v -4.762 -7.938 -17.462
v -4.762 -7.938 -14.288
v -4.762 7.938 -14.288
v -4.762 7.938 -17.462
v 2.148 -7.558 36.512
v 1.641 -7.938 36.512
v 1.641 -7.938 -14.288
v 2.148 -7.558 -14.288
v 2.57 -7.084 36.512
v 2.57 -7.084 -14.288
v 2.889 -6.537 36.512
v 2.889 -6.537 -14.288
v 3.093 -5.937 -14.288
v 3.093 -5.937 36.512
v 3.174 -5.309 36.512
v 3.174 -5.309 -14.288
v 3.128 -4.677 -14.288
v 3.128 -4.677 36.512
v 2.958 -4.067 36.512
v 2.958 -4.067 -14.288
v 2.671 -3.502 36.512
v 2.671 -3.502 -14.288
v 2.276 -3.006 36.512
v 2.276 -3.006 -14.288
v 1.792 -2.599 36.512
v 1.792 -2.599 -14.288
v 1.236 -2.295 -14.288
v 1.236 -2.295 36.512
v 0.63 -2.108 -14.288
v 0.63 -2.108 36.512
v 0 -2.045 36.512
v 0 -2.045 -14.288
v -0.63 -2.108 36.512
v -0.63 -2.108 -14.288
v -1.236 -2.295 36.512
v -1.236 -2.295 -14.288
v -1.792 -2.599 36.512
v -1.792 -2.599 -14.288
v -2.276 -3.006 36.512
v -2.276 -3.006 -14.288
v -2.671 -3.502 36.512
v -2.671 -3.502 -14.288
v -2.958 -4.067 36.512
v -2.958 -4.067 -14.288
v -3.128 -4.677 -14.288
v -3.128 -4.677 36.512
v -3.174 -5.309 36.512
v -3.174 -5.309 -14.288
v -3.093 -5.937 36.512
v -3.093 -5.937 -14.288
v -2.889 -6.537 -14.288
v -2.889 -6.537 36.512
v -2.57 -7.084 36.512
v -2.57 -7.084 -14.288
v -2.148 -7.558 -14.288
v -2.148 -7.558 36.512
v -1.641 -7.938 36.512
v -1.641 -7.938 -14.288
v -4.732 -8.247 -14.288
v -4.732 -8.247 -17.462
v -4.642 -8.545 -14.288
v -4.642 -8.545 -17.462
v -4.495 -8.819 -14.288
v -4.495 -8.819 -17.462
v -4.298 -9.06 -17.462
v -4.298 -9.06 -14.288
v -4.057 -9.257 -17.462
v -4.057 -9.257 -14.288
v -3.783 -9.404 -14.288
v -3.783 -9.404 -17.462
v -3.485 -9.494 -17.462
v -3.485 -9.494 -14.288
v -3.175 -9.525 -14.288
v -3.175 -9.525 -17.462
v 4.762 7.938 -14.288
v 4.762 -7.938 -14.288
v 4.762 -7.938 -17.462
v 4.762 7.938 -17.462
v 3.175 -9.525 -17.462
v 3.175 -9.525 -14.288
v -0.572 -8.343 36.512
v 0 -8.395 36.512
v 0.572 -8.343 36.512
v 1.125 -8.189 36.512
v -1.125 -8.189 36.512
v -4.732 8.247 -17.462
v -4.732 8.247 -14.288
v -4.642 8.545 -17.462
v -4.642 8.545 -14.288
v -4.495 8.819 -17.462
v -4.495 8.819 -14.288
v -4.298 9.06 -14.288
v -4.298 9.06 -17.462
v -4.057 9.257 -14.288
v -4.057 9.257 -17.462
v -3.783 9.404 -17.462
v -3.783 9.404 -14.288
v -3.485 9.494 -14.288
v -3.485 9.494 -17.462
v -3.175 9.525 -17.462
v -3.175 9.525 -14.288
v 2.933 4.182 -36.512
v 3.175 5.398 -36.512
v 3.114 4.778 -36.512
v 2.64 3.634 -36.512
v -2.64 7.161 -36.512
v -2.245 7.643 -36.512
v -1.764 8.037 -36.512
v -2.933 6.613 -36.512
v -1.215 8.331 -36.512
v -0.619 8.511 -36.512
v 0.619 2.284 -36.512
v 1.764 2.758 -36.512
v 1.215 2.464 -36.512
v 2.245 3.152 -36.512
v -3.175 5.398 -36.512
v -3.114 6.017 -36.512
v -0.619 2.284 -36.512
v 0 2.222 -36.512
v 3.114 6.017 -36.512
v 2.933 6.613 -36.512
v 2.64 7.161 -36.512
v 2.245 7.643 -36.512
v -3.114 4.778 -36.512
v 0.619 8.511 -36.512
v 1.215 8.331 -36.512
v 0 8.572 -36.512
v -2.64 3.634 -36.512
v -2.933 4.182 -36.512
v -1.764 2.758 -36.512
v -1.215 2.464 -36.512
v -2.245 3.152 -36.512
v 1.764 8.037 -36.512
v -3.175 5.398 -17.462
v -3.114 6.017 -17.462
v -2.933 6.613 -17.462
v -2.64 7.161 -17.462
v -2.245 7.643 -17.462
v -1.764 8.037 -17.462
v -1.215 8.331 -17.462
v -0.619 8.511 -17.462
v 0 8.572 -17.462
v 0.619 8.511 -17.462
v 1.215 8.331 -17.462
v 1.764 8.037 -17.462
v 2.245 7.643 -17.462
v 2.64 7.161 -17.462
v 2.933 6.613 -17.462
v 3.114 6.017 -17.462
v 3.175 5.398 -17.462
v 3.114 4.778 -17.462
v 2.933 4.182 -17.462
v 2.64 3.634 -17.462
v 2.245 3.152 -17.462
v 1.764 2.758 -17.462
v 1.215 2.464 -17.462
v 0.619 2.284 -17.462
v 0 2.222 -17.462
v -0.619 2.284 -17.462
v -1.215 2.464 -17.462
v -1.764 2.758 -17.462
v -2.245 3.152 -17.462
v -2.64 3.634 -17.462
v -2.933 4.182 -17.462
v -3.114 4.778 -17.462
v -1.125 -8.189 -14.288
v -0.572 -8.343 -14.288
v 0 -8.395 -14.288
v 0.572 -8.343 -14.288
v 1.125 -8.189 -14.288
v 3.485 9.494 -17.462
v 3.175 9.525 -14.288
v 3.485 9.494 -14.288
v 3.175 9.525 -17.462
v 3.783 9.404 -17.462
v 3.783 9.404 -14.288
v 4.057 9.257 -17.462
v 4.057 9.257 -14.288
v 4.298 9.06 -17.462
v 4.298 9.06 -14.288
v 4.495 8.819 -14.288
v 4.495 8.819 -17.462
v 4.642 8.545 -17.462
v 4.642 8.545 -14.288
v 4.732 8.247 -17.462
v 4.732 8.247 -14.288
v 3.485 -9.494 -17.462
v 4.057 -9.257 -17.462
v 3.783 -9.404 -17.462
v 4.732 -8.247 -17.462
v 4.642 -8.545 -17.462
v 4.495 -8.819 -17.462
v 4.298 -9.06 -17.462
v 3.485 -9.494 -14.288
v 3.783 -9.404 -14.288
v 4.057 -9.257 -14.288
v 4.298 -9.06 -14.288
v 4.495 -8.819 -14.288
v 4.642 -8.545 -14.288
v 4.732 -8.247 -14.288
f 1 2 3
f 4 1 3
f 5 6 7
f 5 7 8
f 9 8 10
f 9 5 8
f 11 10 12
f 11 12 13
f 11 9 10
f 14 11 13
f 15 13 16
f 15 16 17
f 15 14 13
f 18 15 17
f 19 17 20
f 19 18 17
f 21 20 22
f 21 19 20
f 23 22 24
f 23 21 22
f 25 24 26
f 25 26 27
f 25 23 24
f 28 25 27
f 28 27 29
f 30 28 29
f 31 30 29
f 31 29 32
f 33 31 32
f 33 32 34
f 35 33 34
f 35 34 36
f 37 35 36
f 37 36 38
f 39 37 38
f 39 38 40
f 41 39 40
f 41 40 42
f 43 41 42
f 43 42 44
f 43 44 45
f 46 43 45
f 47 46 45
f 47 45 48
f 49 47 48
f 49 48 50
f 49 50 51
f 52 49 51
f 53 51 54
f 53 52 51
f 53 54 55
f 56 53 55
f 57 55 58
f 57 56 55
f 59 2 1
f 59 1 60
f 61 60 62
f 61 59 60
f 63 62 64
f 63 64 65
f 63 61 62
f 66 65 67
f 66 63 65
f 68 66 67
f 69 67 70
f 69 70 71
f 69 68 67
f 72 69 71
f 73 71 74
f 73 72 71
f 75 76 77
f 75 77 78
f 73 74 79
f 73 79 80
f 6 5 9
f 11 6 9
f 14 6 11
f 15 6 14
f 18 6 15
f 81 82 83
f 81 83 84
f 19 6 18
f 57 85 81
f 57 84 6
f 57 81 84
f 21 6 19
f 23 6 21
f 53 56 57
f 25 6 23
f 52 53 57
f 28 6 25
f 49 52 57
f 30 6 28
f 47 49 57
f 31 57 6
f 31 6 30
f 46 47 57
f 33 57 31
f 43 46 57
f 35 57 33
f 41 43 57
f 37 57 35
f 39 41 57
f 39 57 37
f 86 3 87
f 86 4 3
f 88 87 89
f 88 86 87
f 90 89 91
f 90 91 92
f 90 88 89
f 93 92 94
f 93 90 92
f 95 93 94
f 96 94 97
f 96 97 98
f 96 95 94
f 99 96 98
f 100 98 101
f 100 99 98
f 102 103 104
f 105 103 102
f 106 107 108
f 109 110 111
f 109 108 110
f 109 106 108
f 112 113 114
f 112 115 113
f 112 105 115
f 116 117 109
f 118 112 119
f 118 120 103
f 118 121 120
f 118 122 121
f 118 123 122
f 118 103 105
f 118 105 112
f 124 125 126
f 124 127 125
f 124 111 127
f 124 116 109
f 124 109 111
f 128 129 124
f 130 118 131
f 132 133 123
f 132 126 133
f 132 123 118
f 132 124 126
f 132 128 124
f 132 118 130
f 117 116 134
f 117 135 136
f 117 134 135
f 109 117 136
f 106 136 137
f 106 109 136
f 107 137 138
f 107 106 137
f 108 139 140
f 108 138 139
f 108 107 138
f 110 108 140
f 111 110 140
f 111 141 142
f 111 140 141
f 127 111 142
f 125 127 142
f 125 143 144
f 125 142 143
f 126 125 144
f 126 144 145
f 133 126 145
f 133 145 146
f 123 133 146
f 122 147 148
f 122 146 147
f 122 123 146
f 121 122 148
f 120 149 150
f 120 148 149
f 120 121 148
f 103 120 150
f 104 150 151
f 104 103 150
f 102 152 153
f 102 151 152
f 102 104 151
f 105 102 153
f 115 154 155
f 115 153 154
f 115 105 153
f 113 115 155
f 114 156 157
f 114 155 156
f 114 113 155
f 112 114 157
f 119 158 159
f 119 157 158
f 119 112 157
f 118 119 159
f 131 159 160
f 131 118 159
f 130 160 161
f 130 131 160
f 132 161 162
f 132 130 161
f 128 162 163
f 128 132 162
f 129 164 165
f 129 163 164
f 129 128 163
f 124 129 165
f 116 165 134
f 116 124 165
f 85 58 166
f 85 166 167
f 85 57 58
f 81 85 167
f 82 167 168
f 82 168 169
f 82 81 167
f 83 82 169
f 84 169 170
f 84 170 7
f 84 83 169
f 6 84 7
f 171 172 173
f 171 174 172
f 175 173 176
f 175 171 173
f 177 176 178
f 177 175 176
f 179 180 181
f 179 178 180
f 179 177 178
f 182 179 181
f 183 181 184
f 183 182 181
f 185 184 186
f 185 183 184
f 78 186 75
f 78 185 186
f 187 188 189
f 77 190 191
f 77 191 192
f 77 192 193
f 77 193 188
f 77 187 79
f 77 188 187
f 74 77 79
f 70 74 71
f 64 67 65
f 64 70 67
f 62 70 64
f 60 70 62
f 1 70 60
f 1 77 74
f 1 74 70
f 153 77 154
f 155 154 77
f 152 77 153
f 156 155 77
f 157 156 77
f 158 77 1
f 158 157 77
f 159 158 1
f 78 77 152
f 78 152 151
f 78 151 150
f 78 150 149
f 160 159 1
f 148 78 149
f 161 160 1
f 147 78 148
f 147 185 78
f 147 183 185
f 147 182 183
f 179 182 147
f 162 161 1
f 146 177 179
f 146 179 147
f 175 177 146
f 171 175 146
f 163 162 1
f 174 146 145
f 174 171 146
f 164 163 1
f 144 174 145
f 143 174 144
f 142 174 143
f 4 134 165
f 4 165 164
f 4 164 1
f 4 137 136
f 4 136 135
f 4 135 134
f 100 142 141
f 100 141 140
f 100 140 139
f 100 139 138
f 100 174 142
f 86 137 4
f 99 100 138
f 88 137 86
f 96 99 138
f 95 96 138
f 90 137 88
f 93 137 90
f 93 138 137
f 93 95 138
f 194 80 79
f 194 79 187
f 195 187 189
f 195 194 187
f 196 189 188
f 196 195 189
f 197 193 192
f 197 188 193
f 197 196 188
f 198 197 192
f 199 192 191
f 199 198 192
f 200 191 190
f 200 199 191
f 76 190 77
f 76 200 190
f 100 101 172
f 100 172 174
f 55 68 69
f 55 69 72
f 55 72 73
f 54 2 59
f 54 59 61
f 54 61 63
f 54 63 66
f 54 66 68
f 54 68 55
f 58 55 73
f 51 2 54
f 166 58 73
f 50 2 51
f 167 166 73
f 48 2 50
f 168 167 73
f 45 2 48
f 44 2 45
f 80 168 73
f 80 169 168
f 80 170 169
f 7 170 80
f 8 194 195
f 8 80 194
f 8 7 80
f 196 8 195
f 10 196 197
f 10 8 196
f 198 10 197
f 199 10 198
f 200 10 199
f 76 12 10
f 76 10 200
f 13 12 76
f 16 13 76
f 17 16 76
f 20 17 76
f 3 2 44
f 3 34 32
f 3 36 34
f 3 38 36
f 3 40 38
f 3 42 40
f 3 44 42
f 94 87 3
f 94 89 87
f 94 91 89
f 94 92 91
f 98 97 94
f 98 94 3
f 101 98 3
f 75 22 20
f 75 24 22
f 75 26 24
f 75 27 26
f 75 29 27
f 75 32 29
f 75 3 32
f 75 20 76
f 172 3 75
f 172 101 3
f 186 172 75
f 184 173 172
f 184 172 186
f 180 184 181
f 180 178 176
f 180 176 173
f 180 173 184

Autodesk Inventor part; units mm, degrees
ref_plane "YZ Plane" through (0, 0, 0) normal (1, 0, 0) x (0, 1, 0)
ref_plane "XZ Plane" through (0, 0, 0) normal (0, 1, 0) x (-1, 0, 0)
ref_plane "XY Plane" through (0, 0, 0) normal (0, 0, 1) x (1, 0, 0)
sketch "Sketch1" plane through (0, 0, 0) normal (1, 0, 0) x (0, 1, 0)
  line L0 (-9.525, 36.5125) -> (9.525, 36.5125)
  line L1 (9.525, 36.5125) -> (9.525, -36.5125)
  line L2 (9.525, -36.5125) -> (-9.525, -36.5125)
  line L3 (-9.525, -36.5125) -> (-9.525, 36.5125)
  line L4 (-9.525, 36.5125) -> (9.525, -36.5125) construction
  line L5 (9.525, 36.5125) -> (-9.525, -36.5125) construction
  point P0 (0, 0)
  dimension "d0" = 19.05
  dimension "d1" = 73.025
extrude "Extrusion1" add sketch "Sketch1" along normal mid plane 9.525
sketch "Sketch2" plane through (4.7625, 0, 0) normal (1, 0, 0) x (0, 0, -1)
  line L0 (-36.5125, 9.525) -> (-36.5125, -9.525) projected
  line L1 (-36.5125, 9.525) -> (14.2875, 9.525)
  line L2 (14.2875, 9.525) -> (14.2875, -1.5875)
  line L3 (14.2875, -1.5875) -> (-36.5125, -1.5875)
  line L4 (-36.5125, -1.5875) -> (-36.5125, 9.525)
  line L5 (-36.5125, -9.525) -> (36.5125, -9.525) projected
  point P0 (0, 0)
  dimension "d4" = 50.8
  dimension "d6" = 7.9375
extrude "Extrusion2" cut sketch "Sketch2" against normal blind 9.525
sketch "Sketch3" plane through (4.7625, 0, 0) normal (1, 0, 0) x (0, 0, -1)
  line L0 (36.5125, -9.525) -> (-36.5125, -9.525) projected
  line L1 (36.5125, -9.525) -> (17.4625, -9.525)
  line L2 (17.4625, -9.525) -> (17.4625, 1.5875)
  line L3 (17.4625, 1.5875) -> (36.5125, 1.5875)
  line L4 (36.5125, 1.5875) -> (36.5125, -9.525)
  line L5 (14.2875, 9.525) -> (14.2875, -1.5875) projected
  line L6 (36.5125, 9.525) -> (14.2875, 9.525) projected
  point P0 (0, 0)
  dimension "d9" = 3.175
  dimension "d10" = 7.9375
extrude "Extrusion3" cut sketch "Sketch3" against normal blind 9.525
sketch "Sketch4" plane through (4.7625, 0, 0) normal (1, 0, 0) x (0, 0, -1)
  line L0 (-36.5125, -1.5875) -> (-36.5125, -9.525) projected
  line L1 (-36.5125, -9.525) -> (14.2875, -9.525)
  line L2 (14.2875, -9.525) -> (14.2875, -7.9375)
  line L3 (14.2875, -7.9375) -> (-36.5125, -7.9375)
  line L4 (-36.5125, -7.9375) -> (-36.5125, -9.525)
  point P0 (0, 0)
  dimension "d13" = 50.8
  dimension "d14" = 1.5875
extrude "Extrusion4" cut sketch "Sketch4" against normal blind 9.525
sketch "Sketch5" plane through (4.7625, 0, 0) normal (1, 0, 0) x (0, 0, -1)
  line L0 (36.5125, 9.525) -> (36.5125, 1.5875) projected
  line L1 (36.5125, 9.525) -> (17.4625, 9.525)
  line L2 (17.4625, 9.525) -> (17.4625, 7.9375)
  line L3 (17.4625, 7.9375) -> (36.5125, 7.9375)
  line L4 (36.5125, 7.9375) -> (36.5125, 9.525)
  point P0 (0, 0)
  dimension "d17" = 19.05
  dimension "d18" = 1.5875
extrude "Extrusion5" cut sketch "Sketch5" against normal blind 9.525
sketch "Sketch7" plane through (4.7625, 1.5875, -36.5125) normal (0, 0, -1) x (-1, 0, 0)
  line L0 (9.525, 6.35) -> (9.525, 0) projected
  line L1 (0, 0) -> (0, 6.35) projected
  line L2 (9.525, 6.35) -> (0, 6.35)
  line L3 (0, 6.35) -> (0, 0)
  line L4 (0, 0) -> (9.525, 0)
  line L5 (9.525, 0) -> (9.525, 6.35)
  circle A0 centre (4.7625, 3.81) radius 3.175
  point P0 (4.7625, -1.5875)
  dimension "d26" = 6.35
  dimension "d27" = 4.7625
  dimension "d28" = 3.81
extrude "Extrusion7" add sketch "Sketch7" against normal blind 19.05 contours A0 L2 | L2 A0
sketch "Sketch6" plane through (-4.7625, -1.5875, 36.5125) normal (0, 0, 1) x (1, 0, 0)
  line L0 (9.525, -6.35) -> (0, -6.35) projected
  line L1 (9.525, 0) -> (0, 0) projected
  line L2 (0, -6.35) -> (9.525, -6.35)
  line L3 (9.525, -6.35) -> (9.525, 0)
  line L4 (9.525, 0) -> (0, 0)
  line L5 (0, 0) -> (0, -6.35)
  circle A0 centre (4.7625, -3.6322) radius 3.175
  point P0 (4.7625, 1.5875)
  dimension "d21" = 6.35
  dimension "d22" = 3.6322
  dimension "d23" = 4.7625
extrude "Extrusion6" add sketch "Sketch6" against normal blind 50.8
fillet "Fillet1" radius 1.5875 4 edges at (4.7625, 9.525, -15.875) (-4.7625, 9.525, -15.875) (4.7625, -9.525, -15.875) (-4.7625, -9.525, -15.875)
sketch "Sketch8" plane through (4.7625, 1.5875, -36.5125) normal (0, 0, -1) x (-1, 0, 0)
  arc A0 (6.6675, 6.35) -> (2.8575, 6.35) centre (4.7625, 3.81) ccw projected
  circle A1 centre (4.7625, 3.81) radius 3.175
  line L0 (0, 6.35) -> (2.8575, 6.35) projected
  line L1 (2.8575, 6.35) -> (0, 6.35)
  line L2 (0, 0) -> (0, 6.35) projected
  line L3 (0, 0) -> (9.525, 0) projected
  line L4 (9.525, 6.35) -> (9.525, 0) projected
  line L5 (2.8575, 6.35) -> (0, 6.35) projected
  line L6 (0, 0) -> (0, 6.35) projected
  line L7 (0, 0) -> (9.525, 0) projected
  line L8 (9.525, 6.35) -> (9.525, 0) projected
  line L9 (9.525, 6.35) -> (6.6675, 6.35) projected
  arc A2 (6.6675, 6.35) -> (2.8575, 6.35) centre (4.7625, 3.81) ccw projected
  line L10 (0, 0) -> (9.525, 0) projected
  line L11 (0, 6.35) -> (0, 0)
  line L12 (0, 0) -> (9.525, 0)
  line L13 (9.525, 0) -> (9.525, 6.35)
  point P0 (4.7625, -1.5875)
extrude "Extrusion8" cut sketch "Sketch8" against normal blind 19.05 contours L9 L4 L3 L2 L0 A1
sketch "Sketch9" plane through (-4.7625, -1.5875, 36.5125) normal (0, 0, 1) x (1, 0, 0)
  arc A0 (3.1211, -6.35) -> (6.4039, -6.35) centre (4.7625, -3.6322) ccw projected
  line L0 (0, -6.35) -> (3.1211, -6.35) projected
  arc A1 (3.1211, -6.35) -> (6.4039, -6.35) centre (4.7625, -3.6322) ccw projected
  line L1 (6.4039, -6.35) -> (9.525, -6.35) projected
  line L2 (9.525, 0) -> (9.525, -6.35) projected
  line L3 (9.525, 0) -> (0, 0) projected
  line L4 (0, -6.35) -> (0, 0) projected
  arc A2 (6.4039, -6.35) -> (3.1211, -6.35) centre (4.7625, -3.6322) ccw
  arc A3 (3.1211, -6.35) -> (6.4039, -6.35) centre (4.7625, -3.6322) ccw projected
  line L5 (0, -6.35) -> (0, 0) projected
  line L6 (3.1211, -6.35) -> (0, -6.35)
  line L7 (0, -6.35) -> (0, 0)
  line L8 (9.525, 0) -> (0, 0) projected
  line L9 (0, 0) -> (9.525, 0)
  line L10 (9.525, 0) -> (9.525, -6.35) projected
  line L11 (9.525, 0) -> (9.525, -6.35)
  line L12 (9.525, -6.35) -> (6.4039, -6.35) projected
  line L13 (9.525, -6.35) -> (6.4039, -6.35)
  point P0 (4.7625, 1.5875)
extrude "Extrusion9" cut sketch "Sketch9" against normal blind 50.8 contours L0 L4 L3 L2 L1 A2
properties part number "CrankShaft"
